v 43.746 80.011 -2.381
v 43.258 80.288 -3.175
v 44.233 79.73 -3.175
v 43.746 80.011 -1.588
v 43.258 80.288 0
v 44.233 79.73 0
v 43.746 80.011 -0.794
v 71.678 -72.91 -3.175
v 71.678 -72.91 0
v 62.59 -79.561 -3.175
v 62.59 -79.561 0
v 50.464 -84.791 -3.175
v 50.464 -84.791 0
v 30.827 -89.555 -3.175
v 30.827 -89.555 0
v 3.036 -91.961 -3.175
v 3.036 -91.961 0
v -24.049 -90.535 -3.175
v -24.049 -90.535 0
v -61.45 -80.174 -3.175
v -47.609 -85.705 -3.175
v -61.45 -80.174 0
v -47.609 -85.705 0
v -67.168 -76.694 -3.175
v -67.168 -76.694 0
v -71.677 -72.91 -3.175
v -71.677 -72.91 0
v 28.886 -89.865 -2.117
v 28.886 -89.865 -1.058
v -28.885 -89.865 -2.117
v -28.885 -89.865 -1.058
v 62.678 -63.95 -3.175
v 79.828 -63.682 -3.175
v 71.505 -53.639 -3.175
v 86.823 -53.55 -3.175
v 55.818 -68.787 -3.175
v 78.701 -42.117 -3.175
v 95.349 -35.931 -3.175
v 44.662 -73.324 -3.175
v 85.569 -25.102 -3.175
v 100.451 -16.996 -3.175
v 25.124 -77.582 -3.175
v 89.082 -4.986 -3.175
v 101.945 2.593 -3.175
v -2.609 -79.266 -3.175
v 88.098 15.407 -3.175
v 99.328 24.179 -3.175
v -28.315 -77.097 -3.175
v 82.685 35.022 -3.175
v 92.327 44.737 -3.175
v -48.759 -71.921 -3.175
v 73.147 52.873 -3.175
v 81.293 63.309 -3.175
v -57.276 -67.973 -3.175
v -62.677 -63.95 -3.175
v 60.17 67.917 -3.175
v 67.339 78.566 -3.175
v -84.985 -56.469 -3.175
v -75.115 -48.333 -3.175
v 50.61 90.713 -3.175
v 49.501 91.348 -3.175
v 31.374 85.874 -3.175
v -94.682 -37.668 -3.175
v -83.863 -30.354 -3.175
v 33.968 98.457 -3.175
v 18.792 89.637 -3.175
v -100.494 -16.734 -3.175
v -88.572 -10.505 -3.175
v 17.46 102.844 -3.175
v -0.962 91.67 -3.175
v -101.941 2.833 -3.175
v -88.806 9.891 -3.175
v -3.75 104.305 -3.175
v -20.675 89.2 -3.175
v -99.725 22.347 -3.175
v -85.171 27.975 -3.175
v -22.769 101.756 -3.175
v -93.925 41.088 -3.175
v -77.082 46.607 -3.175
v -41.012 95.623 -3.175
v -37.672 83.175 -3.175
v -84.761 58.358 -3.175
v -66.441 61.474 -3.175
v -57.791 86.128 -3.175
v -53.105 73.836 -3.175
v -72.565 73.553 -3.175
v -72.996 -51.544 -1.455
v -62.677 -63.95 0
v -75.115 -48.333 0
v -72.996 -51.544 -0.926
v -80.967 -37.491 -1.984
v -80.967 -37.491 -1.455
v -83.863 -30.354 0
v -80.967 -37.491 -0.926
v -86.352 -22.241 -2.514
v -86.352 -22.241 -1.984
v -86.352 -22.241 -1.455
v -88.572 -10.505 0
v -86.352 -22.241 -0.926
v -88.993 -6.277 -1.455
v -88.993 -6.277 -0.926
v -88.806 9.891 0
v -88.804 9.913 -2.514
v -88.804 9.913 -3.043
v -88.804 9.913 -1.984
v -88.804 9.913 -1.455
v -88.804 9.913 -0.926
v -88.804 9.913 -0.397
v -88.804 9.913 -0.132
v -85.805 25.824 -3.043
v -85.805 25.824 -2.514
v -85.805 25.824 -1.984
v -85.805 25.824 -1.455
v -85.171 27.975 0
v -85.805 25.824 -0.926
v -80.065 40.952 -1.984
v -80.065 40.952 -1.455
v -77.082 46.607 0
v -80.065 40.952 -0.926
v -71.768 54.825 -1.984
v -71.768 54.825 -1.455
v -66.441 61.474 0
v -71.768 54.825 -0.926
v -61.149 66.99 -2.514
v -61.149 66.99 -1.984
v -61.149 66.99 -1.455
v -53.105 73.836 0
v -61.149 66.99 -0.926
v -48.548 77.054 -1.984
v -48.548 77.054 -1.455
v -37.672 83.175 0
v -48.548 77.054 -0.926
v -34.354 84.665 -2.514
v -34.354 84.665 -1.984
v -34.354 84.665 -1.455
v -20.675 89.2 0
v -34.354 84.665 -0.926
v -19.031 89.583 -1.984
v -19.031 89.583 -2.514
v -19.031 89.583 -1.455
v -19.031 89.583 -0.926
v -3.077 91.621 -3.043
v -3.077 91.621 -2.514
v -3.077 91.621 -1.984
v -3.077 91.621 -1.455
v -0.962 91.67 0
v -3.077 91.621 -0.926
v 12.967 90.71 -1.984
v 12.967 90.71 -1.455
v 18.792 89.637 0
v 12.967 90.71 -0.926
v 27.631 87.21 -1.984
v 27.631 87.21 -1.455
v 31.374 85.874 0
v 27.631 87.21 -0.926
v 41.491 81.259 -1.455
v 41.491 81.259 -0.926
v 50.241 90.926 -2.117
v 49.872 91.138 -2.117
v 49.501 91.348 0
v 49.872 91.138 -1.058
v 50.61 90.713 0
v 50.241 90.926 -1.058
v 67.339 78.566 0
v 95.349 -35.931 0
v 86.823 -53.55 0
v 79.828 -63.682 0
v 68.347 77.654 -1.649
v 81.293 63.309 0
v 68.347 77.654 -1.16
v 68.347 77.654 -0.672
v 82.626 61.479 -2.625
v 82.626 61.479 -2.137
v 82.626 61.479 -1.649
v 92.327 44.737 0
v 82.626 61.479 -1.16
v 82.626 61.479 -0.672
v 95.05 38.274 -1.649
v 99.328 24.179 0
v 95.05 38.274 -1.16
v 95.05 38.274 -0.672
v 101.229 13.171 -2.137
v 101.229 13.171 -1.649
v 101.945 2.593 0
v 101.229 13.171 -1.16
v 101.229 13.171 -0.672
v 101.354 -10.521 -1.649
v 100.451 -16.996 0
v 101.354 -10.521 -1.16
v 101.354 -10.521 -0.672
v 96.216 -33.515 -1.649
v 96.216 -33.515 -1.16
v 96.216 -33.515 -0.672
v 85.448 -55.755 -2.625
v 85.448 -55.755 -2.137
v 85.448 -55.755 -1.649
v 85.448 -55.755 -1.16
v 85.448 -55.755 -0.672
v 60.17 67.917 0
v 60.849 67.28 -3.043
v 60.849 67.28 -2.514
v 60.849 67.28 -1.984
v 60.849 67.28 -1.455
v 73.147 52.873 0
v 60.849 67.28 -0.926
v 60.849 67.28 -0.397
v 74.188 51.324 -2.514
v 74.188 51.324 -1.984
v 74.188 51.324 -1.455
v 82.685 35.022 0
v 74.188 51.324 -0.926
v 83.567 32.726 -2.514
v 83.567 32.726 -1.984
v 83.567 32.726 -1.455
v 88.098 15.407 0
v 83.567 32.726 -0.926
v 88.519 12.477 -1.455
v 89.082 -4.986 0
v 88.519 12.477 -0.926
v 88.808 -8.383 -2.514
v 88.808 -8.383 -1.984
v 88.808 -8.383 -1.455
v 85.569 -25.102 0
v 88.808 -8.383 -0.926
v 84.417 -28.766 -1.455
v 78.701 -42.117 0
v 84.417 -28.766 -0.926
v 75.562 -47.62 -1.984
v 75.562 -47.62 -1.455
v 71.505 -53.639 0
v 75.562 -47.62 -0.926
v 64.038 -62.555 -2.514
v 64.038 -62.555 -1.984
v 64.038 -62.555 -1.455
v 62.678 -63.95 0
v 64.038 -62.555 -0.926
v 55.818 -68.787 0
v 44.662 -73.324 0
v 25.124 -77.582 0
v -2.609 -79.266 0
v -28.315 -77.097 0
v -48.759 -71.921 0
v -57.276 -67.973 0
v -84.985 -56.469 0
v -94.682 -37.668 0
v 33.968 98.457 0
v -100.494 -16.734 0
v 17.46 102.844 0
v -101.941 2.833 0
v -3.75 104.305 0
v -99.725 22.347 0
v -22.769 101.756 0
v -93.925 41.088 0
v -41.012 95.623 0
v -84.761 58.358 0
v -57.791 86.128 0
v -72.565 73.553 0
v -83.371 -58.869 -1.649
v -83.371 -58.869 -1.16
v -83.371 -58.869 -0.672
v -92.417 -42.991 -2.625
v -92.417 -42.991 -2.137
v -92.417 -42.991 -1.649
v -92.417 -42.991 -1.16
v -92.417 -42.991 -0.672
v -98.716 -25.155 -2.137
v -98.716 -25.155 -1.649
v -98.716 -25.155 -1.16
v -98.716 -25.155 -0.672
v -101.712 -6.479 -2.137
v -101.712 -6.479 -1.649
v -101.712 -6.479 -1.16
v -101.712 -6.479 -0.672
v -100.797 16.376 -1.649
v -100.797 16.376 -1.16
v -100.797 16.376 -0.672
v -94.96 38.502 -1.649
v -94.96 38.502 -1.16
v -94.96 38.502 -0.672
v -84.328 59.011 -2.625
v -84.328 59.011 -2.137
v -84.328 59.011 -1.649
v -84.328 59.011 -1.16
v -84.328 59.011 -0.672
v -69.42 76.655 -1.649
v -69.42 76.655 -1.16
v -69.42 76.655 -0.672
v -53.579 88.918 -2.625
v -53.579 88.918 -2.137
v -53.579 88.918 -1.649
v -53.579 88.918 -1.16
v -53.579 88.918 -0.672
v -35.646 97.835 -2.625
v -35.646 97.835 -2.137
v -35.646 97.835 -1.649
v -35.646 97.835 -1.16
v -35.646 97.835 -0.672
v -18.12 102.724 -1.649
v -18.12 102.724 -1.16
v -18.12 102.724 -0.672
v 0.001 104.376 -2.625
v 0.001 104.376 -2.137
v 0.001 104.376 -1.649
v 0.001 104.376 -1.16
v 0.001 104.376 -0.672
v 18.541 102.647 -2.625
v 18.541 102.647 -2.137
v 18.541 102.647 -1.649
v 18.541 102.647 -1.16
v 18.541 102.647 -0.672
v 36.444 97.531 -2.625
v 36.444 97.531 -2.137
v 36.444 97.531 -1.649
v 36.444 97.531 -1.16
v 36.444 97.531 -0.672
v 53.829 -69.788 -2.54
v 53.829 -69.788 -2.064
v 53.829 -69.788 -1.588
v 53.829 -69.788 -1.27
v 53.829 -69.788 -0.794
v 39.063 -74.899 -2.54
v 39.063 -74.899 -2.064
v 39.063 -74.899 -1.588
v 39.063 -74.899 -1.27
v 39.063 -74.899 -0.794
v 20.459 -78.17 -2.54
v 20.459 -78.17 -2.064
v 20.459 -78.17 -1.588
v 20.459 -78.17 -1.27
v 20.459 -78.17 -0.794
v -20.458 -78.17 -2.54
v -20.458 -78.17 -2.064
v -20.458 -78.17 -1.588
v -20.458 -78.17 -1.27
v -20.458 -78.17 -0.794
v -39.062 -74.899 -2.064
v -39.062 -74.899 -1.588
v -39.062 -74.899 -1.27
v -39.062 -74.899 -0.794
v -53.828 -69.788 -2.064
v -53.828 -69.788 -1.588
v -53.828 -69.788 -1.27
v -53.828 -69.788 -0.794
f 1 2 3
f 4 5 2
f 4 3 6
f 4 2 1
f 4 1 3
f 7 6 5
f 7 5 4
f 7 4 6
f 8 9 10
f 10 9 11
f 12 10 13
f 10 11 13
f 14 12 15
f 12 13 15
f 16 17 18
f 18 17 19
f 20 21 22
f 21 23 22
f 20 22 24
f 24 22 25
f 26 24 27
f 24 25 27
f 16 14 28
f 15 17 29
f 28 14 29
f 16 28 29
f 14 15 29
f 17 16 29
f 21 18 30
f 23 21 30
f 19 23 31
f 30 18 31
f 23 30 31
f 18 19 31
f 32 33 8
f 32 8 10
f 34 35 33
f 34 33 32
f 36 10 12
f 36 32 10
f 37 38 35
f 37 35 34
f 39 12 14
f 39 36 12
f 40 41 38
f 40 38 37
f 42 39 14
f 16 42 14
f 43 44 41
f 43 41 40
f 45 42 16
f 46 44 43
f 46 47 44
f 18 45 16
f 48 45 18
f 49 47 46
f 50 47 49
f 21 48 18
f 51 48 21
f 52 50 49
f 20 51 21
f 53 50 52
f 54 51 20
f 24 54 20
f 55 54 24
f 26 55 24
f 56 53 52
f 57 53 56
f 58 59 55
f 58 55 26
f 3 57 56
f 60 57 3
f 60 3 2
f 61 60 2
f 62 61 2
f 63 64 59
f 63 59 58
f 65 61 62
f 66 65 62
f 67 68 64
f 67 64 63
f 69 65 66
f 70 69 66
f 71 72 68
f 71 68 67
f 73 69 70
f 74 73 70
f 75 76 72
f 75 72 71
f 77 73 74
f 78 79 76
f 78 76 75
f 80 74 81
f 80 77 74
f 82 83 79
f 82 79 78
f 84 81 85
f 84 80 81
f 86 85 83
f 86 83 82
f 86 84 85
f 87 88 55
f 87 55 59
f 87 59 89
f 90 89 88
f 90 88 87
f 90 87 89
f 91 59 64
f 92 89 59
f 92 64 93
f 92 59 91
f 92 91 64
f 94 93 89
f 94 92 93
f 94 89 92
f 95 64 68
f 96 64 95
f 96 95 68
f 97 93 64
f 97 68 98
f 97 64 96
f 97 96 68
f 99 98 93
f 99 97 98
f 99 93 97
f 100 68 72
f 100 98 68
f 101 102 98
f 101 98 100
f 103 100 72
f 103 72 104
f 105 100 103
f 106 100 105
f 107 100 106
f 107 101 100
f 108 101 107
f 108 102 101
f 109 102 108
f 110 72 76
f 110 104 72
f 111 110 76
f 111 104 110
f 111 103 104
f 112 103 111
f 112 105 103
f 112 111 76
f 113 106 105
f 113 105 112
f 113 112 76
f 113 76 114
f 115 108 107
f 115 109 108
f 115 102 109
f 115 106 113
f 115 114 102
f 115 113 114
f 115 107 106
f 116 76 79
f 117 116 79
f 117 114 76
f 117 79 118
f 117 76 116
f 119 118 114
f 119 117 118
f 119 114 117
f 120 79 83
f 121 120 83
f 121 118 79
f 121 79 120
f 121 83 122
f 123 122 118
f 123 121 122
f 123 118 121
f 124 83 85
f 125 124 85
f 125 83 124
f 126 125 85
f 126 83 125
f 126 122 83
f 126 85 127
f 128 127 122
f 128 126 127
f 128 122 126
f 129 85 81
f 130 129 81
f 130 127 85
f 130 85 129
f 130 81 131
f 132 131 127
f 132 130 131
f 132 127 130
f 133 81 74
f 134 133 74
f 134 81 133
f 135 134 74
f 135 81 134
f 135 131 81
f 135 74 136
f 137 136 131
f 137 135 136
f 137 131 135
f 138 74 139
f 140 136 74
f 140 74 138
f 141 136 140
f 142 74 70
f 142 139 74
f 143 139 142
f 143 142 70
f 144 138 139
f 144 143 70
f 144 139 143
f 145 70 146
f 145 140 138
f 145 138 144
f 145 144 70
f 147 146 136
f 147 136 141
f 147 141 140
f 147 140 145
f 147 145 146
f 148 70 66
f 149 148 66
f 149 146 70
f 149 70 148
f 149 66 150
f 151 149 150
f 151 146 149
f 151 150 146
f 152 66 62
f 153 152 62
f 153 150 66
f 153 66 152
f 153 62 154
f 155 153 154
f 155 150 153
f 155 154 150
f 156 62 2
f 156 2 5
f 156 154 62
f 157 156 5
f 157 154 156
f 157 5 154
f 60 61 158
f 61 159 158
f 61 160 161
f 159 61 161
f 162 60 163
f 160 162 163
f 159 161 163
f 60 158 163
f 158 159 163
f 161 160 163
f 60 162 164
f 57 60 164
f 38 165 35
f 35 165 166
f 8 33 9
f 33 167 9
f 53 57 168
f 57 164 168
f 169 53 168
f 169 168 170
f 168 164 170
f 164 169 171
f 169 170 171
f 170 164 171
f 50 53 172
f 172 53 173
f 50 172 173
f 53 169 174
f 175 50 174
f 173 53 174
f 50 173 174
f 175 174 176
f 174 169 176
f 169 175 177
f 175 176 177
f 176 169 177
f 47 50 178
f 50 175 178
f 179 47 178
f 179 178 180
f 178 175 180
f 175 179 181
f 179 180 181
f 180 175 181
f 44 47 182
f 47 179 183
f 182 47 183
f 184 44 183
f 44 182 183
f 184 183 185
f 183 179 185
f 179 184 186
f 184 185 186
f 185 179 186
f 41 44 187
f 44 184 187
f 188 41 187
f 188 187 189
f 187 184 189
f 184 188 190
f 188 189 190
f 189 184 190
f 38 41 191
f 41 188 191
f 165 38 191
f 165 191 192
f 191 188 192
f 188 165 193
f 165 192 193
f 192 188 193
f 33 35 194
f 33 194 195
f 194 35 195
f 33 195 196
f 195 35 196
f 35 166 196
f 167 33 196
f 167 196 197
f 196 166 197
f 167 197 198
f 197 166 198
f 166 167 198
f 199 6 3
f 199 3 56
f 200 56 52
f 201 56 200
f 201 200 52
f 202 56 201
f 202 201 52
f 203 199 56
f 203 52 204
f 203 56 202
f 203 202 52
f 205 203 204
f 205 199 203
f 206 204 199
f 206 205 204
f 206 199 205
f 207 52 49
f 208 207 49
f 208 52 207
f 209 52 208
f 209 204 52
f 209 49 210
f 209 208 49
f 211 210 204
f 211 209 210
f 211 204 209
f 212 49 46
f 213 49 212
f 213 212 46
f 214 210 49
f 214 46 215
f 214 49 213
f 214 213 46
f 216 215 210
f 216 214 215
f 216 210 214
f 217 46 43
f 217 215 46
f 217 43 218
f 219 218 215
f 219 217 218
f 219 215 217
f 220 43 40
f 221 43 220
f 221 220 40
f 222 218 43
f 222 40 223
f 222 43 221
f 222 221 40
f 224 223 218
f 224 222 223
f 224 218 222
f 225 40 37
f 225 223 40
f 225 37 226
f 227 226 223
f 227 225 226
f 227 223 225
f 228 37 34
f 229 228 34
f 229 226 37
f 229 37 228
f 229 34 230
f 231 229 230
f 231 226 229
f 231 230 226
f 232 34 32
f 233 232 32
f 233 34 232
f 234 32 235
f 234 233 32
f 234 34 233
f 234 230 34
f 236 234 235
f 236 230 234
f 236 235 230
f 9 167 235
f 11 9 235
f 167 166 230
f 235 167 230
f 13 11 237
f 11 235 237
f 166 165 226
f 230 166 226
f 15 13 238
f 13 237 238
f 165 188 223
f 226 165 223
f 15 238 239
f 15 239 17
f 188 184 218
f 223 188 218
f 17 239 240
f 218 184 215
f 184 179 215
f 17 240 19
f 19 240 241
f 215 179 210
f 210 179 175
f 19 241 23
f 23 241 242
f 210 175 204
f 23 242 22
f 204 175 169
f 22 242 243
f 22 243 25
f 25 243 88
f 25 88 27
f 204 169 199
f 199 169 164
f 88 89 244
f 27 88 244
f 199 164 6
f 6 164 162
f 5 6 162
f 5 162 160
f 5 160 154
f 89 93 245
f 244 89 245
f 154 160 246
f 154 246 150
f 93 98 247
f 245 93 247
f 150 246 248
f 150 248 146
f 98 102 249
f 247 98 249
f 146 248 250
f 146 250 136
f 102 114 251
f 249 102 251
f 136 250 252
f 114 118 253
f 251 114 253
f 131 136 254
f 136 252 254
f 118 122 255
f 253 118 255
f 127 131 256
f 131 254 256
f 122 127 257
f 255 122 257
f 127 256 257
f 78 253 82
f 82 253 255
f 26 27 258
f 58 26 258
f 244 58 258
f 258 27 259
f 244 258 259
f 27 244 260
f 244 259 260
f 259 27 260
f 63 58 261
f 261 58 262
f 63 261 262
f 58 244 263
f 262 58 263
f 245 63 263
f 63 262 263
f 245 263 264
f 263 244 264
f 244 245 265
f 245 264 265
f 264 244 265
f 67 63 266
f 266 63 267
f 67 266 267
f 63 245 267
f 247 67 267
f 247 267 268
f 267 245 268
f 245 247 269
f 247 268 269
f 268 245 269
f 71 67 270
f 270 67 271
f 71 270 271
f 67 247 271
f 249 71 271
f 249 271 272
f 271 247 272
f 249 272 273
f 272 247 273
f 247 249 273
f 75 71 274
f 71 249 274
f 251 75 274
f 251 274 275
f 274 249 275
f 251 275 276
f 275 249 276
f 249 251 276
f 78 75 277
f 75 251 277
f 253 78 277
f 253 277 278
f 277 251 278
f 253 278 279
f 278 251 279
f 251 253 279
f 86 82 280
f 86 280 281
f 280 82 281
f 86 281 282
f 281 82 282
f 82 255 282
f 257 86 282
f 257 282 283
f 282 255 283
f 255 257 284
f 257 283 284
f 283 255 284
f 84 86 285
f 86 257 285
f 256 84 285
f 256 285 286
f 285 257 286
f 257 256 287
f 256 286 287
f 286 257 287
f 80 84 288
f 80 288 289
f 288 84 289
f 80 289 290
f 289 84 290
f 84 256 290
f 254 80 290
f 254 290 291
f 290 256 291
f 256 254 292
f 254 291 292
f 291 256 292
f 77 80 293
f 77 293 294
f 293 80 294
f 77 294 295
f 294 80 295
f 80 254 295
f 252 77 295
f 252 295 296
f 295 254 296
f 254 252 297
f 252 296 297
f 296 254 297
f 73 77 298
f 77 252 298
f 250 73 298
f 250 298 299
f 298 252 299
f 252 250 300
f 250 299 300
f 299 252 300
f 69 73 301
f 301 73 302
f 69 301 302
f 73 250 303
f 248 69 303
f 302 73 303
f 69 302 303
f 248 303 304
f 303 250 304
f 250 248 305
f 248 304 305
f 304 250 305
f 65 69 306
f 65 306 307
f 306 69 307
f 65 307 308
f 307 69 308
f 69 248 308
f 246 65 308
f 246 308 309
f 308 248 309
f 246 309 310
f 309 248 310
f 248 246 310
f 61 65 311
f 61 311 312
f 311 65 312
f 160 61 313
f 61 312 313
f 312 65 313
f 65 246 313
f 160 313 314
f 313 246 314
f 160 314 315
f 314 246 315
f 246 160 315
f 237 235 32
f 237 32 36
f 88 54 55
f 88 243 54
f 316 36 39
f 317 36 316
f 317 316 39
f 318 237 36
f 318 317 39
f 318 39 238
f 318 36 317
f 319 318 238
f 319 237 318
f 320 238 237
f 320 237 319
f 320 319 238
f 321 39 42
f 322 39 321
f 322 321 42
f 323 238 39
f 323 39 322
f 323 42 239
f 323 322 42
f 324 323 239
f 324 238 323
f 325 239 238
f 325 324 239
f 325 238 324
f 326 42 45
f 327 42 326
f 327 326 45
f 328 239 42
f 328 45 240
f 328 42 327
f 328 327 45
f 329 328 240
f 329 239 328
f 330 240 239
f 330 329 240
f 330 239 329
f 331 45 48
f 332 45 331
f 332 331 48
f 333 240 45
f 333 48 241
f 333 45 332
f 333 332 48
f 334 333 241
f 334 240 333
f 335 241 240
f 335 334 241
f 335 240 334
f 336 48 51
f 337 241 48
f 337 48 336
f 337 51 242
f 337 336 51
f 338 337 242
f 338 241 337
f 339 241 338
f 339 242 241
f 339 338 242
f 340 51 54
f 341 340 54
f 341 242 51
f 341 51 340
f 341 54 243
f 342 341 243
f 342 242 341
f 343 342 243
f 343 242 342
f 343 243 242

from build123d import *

# Parameters (mm, degrees)
BOSS_EXTRUDE1_DEPTH = 3.175


with BuildPart() as part:
    # Sketch2 → Boss-Extrude1 (new body)
    with BuildSketch(Plane.XY):
        with BuildLine():
            add(Edge.make_bspline(
                [(-71.677392112, -72.91043434), (-72.109242456, -72.4766599), (-72.972872043, -71.593614958), (-74.469591152, -70.002616718), (-75.837182996, -68.488043391), (-77.186084408, -66.931897067), (-78.515677479, -65.334729876), (-79.824432739, -63.69624614), (-81.54760822, -61.446428575), (-83.64161213, -58.529673548), (-85.629566809, -55.501403393), (-87.162218254, -52.997335562), (-88.285911427, -51.070131488), (-90.114728738, -47.772436811), (-92.549922179, -42.891387424), (-95.3516338, -36.175158441), (-97.806777615, -28.854790192), (-99.416568113, -22.492651102), (-100.484378106, -16.973479224), (-101.217383692, -12.115821661), (-101.805900705, -6.108471449), (-102.055561509, 1.055644647), (-101.63758347, 11.916616183), (-99.581715265, 24.703392789), (-94.947787628, 39.477591596), (-88.656512854, 52.708120751), (-80.043367163, 65.554146484), (-69.871244821, 76.755385293), (-58.636991603, 85.914826096), (-47.202028885, 92.898966836), (-35.790499648, 98.052224226), (-24.000842482, 101.716725174), (-12.029496563, 103.894248368), (-3.656941748, 104.395312689), (0.99110515, 104.372307848), (2.644688984, 104.347784008), (5.295920706, 104.255895368), (8.944129249, 104.002381094), (12.923536456, 103.566176285), (16.897932891, 102.969160213), (20.860675893, 102.210568115), (24.80503533, 101.28991654), (28.724197829, 100.207008268), (32.611281662, 98.961940132), (36.459348765, 97.555109249), (39.942943882, 96.118550993), (42.44327487, 94.981609399), (43.99462248, 94.237634049), (44.922549304, 93.78091779), (45.846607961, 93.314294304), (46.766722746, 92.837849145), (47.682656642, 92.351383169), (48.561810847, 91.873519084), (49.188310006, 91.524412896), (49.500915025, 91.348034768)],
                knots=[0, 0, 0, 0, 0.006795371, 0.013653749, 0.020575359, 0.027560428, 0.034609183, 0.041721853, 0.048898669, 0.063445664, 0.078252032, 0.085753069, 0.093319659, 0.100952039, 0.124124286, 0.148784986, 0.174947707, 0.20262677, 0.215493637, 0.232144402, 0.252599943, 0.276885796, 0.305032091, 0.363115877, 0.408011314, 0.462235121, 0.511576331, 0.564908162, 0.615597651, 0.658548959, 0.700915758, 0.742691235, 0.783870362, 0.824449909, 0.827808956, 0.831171349, 0.841278604, 0.854801757, 0.868378359, 0.882008332, 0.895691582, 0.909427999, 0.923217451, 0.937059793, 0.95095486, 0.964902468, 0.975397534, 0.978902417, 0.982410558, 0.985921952, 0.989436598, 0.99295449, 0.996475625, 1, 1, 1, 1], degree=3))
            add(Edge.make_bspline(
                [(49.500915025, 91.348034768), (49.872005924, 91.138482333), (50.241810712, 90.926750039), (50.610303013, 90.712853821)],
                knots=[0, 0, 0, 0, 1, 1, 1, 1], degree=3))
            add(Edge.make_bspline(
                [(50.610303013, 90.712853821), (51.128442093, 90.411846037), (52.167202685, 89.796039228), (53.932536969, 88.703576387), (55.579762788, 87.638711627), (57.218137155, 86.533145805), (58.847026669, 85.387425363), (60.465187486, 84.201108463), (62.61485058, 82.559008476), (65.268683437, 80.403244909), (68.38020159, 77.661045558), (71.420405526, 74.753669295), (74.379227375, 71.68115848), (77.246352549, 68.444125522), (79.542797672, 65.619898893), (81.324264236, 63.280297585), (82.635173495, 61.479754257), (83.915139631, 59.639466174), (85.682600666, 56.976700672), (87.896856718, 53.369477174), (90.462597049, 48.676901727), (92.889220315, 43.626105667), (95.132677705, 38.215723181), (97.146538959, 32.44823322), (98.88212407, 26.330630408), (100.289240179, 19.875099059), (101.25863273, 13.473856941), (101.817336128, 7.24671143), (102.015185645, 1.305015561), (101.87858065, -4.624237286), (101.39263307, -10.734726225), (100.537146292, -16.867570025), (99.329398352, -22.86381348), (97.893600846, -28.372193875), (96.656960211, -32.269847721), (95.785564151, -34.744415114), (95.0459628, -36.764317914), (93.953188789, -39.535816997), (92.43580554, -43.007047711), (90.821696456, -46.36490671), (89.118620831, -49.608230444), (87.334164726, -52.736260206), (85.475724639, -55.748623833), (83.55049497, -58.64531039), (81.56545684, -61.42664709), (79.307705413, -64.380683017), (77.436977348, -66.647222523), (76.007346494, -68.288860963), (75.29509586, -69.089727056), (74.579038656, -69.87823774), (73.859443089, -70.654502436), (73.136338858, -71.418398838), (72.317504882, -72.264736672), (71.891235125, -72.69667798), (71.678426975, -72.91043429)],
                knots=[0, 0, 0, 0, 0.010157109, 0.020393378, 0.030708694, 0.04110294, 0.051575992, 0.062127721, 0.072757993, 0.094253595, 0.116061609, 0.138180754, 0.160609666, 0.183346893, 0.206390897, 0.218027437, 0.229740057, 0.241528542, 0.253392669, 0.280162256, 0.30828042, 0.337739229, 0.368530108, 0.400643849, 0.434070605, 0.468799897, 0.504820602, 0.536144777, 0.567394405, 0.598569553, 0.629670285, 0.664058743, 0.696204476, 0.726123241, 0.753829745, 0.760691378, 0.767515904, 0.787767528, 0.807687634, 0.827278023, 0.846540474, 0.865476741, 0.88408856, 0.902377642, 0.920345676, 0.937994331, 0.961031903, 0.966703489, 0.972340071, 0.97794171, 0.983508463, 0.989040391, 0.99453755, 1, 1, 1, 1], degree=3))
            add(Edge.make_bspline(
                [(71.678426975, -72.91043429), (46.359928794, -98.341734638), (-46.358893881, -98.341734638), (-71.677392112, -72.91043434)],
                knots=[0, 0, 0, 0, 1, 1, 1, 1], degree=3, weights=[1, 1, 1, 1]))
        make_face()
        with BuildLine():
            add(Edge.make_bspline(
                [(-62.677197057, -63.950161522), (-62.895509204, -63.730876692), (-63.321725733, -63.298342375), (-64.002059554, -62.592101669), (-64.753829554, -61.794622516), (-65.703931611, -60.764569773), (-66.804574903, -59.527416198), (-68.556788175, -57.468052236), (-70.648178443, -54.835505477), (-73.811350461, -50.469012961), (-77.394544541, -44.756057433), (-82.302878117, -35.13540616), (-86.810757895, -22.360038108), (-90.354277409, -0.967371821), (-87.649941962, 26.350088977), (-73.333390238, 55.972118358), (-49.623996274, 78.708841275), (-24.487235723, 89.383519301), (-3.090994932, 92.115890306), (13.038963103, 91.197514401), (26.120286031, 87.996586306), (34.879374941, 84.524845656), (39.102105625, 82.510352052), (41.214271269, 81.410816796), (42.347028641, 80.797644792), (42.959233617, 80.456937494), (43.258169219, 80.288282027)],
                knots=[0, 0, 0, 0, 0.003906217, 0.007812434, 0.01171865, 0.015624867, 0.023437301, 0.031249734, 0.046874602, 0.062499469, 0.093749203, 0.124998938, 0.187498407, 0.249997875, 0.374996813, 0.499995751, 0.624994688, 0.749993626, 0.812493095, 0.874992564, 0.937492033, 0.968741767, 0.984366634, 0.992179068, 0.996085285, 0.999991501, 0.999991501, 0.999991501, 0.999991501], degree=3))
            add(Edge.make_bspline(
                [(43.258169219, 80.288282027), (43.339663738, 80.24226006), (43.502520945, 80.149972739), (43.746371392, 80.01083423), (43.989796594, 79.870982545), (44.151786326, 79.777278604), (44.232713854, 79.73030574)],
                knots=[0.002022438, 0.002022438, 0.002022438, 0.002022438, 0.251013535, 0.500004632, 0.748995729, 0.997986827, 0.997986827, 0.997986827, 0.997986827], degree=3))
            add(Edge.make_bspline(
                [(44.232713854, 79.73030574), (44.58444416, 79.525959484), (45.259622085, 79.127643656), (46.415361761, 78.422292298), (47.573803007, 77.692810893), (49.007921659, 76.758403592), (50.804832808, 75.530634538), (53.607223777, 73.493209173), (57.003409969, 70.790302329), (64.764138566, 63.842060668), (74.853642347, 51.769295456), (84.311822541, 33.000711524), (89.302574517, 12.581832114), (89.594071681, -8.463887057), (85.167338267, -29.022546245), (78.471156755, -43.288686452), (72.737789819, -52.004533398), (70.145497848, -55.492337454), (67.954788222, -58.18874646), (66.537169113, -59.834423786), (65.376799992, -61.124092609), (64.636118066, -61.923784826), (64.04885936, -62.544039678), (63.540759488, -63.072130947), (63.065749199, -63.559376825), (62.8132246, -63.814567336), (62.678231924, -63.950161468)],
                knots=[1.4601e-05, 1.4601e-05, 1.4601e-05, 1.4601e-05, 0.007826987, 0.015639373, 0.023451759, 0.031264145, 0.046888916, 0.062513688, 0.093763232, 0.125012776, 0.250010951, 0.375009125, 0.5000073, 0.625005475, 0.75000365, 0.875001825, 0.906251369, 0.937500913, 0.953125684, 0.968750456, 0.976562842, 0.984375228, 0.988281421, 0.992187614, 0.996093807, 1, 1, 1, 1], degree=3))
            add(Edge.make_bspline(
                [(62.678231924, -63.950161468), (62.442110433, -64.187331736), (61.973465348, -64.632177633), (60.848308103, -65.594894105), (59.178943877, -66.825880953), (56.737455869, -68.325151322), (52.942333804, -70.28884928), (47.260951473, -72.599488515), (39.221466424, -74.977986937), (30.229046438, -76.880115217), (17.304785319, -78.721740765), (0.000517457, -79.658688067), (-17.303750406, -78.721740765), (-30.228011525, -76.880115217), (-39.22043151, -74.977986937), (-47.25991656, -72.599488515), (-52.941298891, -70.28884928), (-56.736420955, -68.325151322), (-59.177908963, -66.825880953), (-60.84727319, -65.594894105), (-61.972430435, -64.632177633), (-62.441075519, -64.187331736), (-62.677197057, -63.950161522)],
                knots=[0, 0, 0, 0, 0.015625, 0.03125, 0.0625, 0.09375, 0.125, 0.1875, 0.25, 0.3125, 0.375, 0.5, 0.625, 0.6875, 0.75, 0.8125, 0.875, 0.90625, 0.9375, 0.96875, 0.984375, 1, 1, 1, 1], degree=3))
        make_face(mode=Mode.SUBTRACT)
    extrude(amount=-BOSS_EXTRUDE1_DEPTH)


solid = part.part
